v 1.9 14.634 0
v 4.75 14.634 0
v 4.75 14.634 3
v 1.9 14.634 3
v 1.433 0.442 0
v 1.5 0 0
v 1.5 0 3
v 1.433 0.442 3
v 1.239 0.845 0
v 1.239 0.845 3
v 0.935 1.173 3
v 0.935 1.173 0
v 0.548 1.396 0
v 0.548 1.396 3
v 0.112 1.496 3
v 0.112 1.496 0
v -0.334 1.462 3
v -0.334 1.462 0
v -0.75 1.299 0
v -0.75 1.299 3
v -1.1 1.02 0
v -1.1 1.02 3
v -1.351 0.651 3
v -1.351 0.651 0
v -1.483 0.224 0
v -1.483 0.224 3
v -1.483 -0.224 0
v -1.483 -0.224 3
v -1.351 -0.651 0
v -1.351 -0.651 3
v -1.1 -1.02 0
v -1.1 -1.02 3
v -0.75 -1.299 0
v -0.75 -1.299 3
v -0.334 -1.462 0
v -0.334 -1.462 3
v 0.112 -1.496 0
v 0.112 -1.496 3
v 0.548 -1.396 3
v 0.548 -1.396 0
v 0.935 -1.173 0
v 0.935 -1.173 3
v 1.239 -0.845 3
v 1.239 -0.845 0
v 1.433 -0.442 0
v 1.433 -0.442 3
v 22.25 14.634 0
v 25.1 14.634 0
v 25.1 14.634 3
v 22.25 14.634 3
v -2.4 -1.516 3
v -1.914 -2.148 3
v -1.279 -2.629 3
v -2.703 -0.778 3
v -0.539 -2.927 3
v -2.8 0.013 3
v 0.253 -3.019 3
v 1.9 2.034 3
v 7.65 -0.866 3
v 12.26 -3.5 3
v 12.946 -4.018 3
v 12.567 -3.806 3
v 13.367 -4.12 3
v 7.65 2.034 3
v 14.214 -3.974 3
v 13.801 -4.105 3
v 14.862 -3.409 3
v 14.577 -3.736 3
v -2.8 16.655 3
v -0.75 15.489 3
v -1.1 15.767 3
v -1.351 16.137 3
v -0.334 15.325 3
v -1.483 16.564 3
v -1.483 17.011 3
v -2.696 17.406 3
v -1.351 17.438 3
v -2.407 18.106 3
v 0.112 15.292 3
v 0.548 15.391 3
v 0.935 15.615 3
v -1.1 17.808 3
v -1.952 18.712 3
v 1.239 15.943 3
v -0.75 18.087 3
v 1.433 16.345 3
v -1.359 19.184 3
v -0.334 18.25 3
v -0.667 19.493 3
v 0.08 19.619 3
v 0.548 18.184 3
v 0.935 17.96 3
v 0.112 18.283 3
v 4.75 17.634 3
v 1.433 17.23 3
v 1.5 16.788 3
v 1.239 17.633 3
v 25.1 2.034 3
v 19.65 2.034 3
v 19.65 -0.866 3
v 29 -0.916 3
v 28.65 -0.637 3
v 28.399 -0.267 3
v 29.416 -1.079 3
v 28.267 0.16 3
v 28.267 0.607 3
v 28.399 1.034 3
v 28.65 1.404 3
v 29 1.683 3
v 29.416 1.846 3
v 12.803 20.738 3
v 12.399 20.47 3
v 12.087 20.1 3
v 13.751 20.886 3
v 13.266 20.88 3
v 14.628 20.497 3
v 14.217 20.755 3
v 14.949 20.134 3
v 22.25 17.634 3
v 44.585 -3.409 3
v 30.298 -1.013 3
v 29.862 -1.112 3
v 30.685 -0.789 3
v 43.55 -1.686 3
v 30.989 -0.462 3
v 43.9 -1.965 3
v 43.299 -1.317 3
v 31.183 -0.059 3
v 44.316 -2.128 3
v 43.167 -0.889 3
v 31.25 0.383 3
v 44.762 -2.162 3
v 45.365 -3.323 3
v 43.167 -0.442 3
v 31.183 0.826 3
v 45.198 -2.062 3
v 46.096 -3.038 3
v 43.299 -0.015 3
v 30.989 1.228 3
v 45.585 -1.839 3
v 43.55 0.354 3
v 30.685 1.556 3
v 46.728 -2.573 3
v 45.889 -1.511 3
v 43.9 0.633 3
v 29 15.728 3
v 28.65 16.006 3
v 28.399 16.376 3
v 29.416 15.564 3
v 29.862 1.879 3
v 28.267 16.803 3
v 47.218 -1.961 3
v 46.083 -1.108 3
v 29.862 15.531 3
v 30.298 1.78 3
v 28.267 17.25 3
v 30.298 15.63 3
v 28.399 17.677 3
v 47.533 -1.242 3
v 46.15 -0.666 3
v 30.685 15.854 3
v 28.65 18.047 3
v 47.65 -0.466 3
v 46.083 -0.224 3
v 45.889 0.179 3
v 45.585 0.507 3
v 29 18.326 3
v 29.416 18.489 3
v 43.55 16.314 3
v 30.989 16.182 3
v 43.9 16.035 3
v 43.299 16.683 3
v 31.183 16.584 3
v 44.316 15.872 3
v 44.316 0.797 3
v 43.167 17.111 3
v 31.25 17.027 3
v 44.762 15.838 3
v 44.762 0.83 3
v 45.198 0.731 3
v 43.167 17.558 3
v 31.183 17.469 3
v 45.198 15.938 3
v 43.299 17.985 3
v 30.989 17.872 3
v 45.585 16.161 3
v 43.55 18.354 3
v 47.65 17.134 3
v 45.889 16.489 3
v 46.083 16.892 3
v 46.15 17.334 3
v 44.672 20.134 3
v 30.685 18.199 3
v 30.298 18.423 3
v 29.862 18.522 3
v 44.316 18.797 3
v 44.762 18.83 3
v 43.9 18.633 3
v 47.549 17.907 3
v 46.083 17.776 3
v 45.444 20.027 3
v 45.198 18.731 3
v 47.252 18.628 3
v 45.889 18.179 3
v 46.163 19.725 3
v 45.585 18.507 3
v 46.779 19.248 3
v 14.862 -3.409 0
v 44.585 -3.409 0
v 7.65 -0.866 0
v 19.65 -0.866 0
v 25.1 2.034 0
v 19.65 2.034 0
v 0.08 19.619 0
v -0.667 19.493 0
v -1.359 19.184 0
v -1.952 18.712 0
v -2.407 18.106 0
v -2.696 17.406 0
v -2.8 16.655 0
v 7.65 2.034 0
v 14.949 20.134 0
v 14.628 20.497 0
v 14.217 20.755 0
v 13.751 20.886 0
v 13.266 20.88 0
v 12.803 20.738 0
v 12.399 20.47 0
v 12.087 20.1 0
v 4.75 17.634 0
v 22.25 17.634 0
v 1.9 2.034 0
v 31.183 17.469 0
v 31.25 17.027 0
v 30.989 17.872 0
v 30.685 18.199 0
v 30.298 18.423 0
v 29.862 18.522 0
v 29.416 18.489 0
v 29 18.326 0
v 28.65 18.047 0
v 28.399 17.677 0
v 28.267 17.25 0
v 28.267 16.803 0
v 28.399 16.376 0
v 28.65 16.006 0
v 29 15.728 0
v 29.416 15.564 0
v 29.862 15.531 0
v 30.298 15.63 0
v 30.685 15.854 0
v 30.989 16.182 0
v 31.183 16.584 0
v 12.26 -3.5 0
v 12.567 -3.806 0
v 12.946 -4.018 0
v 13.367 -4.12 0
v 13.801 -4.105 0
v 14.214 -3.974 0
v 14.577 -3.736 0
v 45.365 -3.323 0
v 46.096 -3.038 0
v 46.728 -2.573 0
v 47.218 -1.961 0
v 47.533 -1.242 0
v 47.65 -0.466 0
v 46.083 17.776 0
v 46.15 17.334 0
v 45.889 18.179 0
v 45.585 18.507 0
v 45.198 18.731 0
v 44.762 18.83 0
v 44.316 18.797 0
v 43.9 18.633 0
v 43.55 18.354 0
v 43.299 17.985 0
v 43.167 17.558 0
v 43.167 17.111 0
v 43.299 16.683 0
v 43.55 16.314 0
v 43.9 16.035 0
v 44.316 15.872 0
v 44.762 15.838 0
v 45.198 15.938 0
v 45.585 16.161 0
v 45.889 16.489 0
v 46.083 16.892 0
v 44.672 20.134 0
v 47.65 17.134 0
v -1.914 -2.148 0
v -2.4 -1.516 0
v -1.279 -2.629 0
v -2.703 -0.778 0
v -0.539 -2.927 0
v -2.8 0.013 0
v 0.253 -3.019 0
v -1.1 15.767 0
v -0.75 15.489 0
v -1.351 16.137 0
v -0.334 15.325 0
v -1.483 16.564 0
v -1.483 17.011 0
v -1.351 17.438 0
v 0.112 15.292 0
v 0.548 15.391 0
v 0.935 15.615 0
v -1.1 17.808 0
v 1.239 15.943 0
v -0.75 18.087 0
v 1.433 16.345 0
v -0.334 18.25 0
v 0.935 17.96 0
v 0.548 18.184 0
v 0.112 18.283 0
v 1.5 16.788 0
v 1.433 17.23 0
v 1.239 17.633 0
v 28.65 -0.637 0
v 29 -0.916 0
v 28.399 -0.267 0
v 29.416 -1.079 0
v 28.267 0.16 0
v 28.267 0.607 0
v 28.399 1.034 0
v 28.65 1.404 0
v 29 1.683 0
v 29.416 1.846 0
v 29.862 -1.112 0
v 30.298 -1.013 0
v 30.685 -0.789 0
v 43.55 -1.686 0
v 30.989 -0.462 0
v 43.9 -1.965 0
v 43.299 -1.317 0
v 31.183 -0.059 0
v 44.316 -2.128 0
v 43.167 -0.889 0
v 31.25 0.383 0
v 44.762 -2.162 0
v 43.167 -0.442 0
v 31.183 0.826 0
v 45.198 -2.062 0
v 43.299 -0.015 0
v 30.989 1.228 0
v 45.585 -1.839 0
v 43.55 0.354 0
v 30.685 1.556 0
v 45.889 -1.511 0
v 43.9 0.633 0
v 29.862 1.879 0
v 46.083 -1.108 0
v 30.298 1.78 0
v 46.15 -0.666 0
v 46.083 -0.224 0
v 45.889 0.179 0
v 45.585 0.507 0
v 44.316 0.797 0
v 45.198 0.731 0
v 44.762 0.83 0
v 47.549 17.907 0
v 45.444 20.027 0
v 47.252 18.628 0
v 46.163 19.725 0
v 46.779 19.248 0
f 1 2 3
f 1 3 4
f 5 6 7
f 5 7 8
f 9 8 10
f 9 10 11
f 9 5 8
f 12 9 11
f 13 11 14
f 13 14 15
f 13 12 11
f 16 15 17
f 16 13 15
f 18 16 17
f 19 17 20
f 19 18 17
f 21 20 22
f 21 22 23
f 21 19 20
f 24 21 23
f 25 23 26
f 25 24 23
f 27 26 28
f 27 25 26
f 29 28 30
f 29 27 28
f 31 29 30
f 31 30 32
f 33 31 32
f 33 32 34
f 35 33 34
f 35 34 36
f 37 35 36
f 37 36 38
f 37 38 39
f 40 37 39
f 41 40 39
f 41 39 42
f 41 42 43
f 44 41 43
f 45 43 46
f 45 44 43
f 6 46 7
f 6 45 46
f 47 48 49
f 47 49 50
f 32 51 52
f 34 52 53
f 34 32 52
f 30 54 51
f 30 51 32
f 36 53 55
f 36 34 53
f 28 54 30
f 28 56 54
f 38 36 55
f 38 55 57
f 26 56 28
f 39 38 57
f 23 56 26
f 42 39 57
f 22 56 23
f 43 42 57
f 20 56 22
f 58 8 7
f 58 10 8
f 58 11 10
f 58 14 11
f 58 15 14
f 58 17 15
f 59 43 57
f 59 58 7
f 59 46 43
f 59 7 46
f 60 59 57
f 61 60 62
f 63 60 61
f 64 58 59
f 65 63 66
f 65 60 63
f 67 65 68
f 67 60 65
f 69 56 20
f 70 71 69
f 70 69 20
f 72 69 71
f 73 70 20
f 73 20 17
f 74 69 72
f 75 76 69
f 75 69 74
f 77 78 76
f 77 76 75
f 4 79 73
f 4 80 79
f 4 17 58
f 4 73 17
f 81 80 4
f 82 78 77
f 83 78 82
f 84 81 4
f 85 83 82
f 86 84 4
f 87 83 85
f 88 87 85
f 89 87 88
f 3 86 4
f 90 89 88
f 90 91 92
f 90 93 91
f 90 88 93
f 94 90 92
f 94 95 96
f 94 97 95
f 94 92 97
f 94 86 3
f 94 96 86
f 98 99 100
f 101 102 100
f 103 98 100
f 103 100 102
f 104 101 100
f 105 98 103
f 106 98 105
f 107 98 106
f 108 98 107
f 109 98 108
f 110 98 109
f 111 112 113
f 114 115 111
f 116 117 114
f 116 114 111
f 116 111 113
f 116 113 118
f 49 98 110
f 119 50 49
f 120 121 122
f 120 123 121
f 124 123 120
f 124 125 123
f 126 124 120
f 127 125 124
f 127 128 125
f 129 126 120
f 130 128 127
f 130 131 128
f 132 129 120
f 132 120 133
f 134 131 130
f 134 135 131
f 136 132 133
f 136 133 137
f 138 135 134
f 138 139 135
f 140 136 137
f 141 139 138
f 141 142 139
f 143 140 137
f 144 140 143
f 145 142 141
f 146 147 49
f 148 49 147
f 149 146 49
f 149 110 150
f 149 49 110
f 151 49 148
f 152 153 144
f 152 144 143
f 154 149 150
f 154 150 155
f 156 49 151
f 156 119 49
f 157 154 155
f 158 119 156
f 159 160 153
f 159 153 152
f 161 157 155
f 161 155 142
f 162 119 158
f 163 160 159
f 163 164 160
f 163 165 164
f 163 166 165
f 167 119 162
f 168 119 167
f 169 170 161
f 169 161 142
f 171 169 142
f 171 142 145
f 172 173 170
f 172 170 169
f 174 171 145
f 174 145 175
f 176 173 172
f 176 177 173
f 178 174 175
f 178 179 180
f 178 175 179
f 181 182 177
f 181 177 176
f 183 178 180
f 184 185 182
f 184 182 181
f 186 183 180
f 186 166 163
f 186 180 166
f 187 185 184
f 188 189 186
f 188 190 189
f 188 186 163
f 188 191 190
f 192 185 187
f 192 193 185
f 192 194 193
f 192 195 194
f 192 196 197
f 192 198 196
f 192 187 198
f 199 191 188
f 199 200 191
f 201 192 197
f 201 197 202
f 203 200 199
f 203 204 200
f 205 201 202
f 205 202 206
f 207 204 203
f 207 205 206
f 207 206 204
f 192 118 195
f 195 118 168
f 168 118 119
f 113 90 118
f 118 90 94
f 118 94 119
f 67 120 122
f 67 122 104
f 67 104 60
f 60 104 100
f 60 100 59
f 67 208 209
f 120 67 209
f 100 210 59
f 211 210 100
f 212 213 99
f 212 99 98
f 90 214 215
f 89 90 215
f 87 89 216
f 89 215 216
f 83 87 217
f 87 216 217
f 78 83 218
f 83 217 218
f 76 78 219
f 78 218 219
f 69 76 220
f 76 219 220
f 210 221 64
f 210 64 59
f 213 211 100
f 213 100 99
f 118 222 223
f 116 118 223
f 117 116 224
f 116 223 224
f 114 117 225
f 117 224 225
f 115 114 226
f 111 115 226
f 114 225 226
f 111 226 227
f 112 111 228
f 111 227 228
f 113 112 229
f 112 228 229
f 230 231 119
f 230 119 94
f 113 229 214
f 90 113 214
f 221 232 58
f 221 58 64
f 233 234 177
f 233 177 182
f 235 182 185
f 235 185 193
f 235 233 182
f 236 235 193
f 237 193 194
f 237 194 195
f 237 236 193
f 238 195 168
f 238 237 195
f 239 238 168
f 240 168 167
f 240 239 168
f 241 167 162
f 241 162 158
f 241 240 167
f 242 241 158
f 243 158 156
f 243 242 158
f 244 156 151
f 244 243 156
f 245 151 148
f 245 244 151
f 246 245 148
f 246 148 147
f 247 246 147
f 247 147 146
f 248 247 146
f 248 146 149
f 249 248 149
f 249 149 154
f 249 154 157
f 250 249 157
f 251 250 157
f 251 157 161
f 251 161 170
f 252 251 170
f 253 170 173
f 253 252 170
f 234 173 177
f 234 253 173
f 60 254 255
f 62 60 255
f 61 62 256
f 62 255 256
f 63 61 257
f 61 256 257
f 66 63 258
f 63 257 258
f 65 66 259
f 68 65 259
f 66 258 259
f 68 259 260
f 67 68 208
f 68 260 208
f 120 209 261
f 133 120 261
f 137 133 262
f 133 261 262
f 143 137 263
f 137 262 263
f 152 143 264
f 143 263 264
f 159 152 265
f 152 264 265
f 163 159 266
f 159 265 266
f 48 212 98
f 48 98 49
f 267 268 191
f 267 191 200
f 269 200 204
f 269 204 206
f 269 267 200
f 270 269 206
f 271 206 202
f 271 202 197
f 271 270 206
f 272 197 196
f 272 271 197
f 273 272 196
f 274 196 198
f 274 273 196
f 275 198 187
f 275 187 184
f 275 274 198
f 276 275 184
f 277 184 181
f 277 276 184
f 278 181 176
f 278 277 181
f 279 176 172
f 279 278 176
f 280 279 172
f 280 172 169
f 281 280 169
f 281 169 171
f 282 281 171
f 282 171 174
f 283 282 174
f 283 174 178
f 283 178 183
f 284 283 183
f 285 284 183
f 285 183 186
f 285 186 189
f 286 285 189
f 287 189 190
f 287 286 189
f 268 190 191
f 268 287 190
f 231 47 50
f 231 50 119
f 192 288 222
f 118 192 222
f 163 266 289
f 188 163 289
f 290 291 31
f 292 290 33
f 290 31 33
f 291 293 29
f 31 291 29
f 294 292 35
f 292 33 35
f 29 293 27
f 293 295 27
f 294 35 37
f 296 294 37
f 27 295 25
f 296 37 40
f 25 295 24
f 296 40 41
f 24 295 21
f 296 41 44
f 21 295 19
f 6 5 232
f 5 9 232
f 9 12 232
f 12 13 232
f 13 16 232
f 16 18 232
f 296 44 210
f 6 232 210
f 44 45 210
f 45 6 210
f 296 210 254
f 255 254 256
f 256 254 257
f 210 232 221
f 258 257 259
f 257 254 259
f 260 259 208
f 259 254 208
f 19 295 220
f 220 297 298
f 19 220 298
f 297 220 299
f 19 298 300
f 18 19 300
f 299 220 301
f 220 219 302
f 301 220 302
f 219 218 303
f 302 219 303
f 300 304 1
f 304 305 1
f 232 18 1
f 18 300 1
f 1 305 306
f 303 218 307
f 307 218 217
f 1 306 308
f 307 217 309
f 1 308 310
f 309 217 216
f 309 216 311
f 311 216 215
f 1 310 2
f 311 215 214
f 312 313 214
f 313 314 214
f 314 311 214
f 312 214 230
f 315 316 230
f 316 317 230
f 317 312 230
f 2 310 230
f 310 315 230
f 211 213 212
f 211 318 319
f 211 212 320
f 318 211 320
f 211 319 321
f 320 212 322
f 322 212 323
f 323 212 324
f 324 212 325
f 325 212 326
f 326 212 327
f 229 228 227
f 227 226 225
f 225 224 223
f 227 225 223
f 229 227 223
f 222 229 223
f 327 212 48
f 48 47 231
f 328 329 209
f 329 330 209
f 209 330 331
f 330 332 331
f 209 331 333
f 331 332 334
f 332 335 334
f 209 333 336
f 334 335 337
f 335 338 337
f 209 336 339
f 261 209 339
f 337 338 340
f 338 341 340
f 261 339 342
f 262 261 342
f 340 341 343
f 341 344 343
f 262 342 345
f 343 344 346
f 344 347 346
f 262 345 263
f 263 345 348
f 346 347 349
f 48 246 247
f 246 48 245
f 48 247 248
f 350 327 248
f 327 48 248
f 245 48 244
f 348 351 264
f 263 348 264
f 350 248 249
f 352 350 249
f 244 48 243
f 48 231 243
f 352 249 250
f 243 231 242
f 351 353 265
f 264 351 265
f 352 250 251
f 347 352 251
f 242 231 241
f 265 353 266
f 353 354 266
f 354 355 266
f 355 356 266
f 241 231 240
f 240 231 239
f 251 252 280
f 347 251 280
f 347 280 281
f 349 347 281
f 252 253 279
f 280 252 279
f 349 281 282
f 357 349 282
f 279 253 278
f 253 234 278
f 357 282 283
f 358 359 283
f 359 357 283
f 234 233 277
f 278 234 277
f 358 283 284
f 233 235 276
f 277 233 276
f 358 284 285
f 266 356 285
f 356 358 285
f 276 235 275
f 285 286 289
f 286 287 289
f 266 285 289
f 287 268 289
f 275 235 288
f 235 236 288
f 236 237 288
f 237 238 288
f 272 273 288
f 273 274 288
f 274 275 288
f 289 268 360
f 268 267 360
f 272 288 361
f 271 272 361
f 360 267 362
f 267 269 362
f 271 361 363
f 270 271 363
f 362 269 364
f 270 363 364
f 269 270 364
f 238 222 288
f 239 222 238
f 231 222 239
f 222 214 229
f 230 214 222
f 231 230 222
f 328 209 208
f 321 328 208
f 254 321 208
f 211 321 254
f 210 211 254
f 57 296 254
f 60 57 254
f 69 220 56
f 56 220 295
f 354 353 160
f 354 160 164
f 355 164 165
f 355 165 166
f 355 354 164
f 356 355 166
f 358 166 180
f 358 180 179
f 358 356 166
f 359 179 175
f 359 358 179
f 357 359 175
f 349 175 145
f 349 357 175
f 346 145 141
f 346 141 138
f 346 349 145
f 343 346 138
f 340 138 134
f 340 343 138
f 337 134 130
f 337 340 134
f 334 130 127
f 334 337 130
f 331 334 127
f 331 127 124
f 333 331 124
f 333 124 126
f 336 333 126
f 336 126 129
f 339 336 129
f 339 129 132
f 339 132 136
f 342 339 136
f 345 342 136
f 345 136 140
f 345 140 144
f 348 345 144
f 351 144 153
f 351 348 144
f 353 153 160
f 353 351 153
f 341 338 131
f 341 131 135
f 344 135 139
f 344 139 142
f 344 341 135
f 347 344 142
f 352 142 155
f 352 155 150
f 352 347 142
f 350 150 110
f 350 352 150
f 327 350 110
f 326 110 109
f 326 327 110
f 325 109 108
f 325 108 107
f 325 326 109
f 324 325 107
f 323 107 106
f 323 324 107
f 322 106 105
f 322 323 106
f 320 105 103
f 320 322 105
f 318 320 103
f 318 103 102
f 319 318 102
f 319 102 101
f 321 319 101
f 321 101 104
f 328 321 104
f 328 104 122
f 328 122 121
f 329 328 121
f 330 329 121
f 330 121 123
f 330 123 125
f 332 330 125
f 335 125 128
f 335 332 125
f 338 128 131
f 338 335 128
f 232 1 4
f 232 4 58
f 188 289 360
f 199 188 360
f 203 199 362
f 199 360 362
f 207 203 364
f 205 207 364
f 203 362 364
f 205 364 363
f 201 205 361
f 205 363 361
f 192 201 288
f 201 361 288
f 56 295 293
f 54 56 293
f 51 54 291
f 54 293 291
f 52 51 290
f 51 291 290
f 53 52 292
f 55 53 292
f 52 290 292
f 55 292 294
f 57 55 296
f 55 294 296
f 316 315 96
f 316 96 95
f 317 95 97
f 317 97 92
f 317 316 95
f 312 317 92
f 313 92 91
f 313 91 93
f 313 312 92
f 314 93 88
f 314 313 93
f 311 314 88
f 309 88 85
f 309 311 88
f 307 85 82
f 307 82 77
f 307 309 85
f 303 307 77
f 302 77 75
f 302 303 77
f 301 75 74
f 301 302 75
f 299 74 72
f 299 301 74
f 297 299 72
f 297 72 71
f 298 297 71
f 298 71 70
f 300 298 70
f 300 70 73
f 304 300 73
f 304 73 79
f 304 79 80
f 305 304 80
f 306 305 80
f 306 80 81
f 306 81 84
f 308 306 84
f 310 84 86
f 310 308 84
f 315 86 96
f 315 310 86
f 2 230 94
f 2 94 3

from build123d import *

# Parameters (mm, degrees)
SKETCH1_R           = 1.5
BOSS_EXTRUDE1_DEPTH = 3


with BuildPart() as part:
    # Sketch1 → Boss-Extrude1 (new body)
    with BuildSketch(Plane.XY):
        with BuildLine():
            Line((44.671696982, 20.134210536), (14.948744814, 20.134210536))
            ThreePointArc((14.948744814, 20.134210536), (13.508437041, 20.900264991), (12.086852766, 20.1))
            Line((12.086852766, 20.1), (0.079653818, 19.618721067))
            ThreePointArc((0.079653818, 19.618721067), (-1.951692295, 18.711836018), (-2.8, 16.655338617))
            Line((-2.8, 16.655338617), (-2.8, 0.013082454))
            ThreePointArc((-2.8, 0.013082454), (-1.91420574, -2.147770093), (0.252672107, -3.018721067))
            Line((0.252672107, -3.018721067), (12.259871055, -3.5))
            ThreePointArc((12.259871055, -3.5), (13.584562431, -4.127366103), (14.862137332, -3.408897008))
            Line((14.862137332, -3.408897008), (44.5850895, -3.408897008))
            ThreePointArc((44.5850895, -3.408897008), (46.728413048, -2.573492827), (47.65, -0.465789464))
            Line((47.65, -0.465789464), (47.65, 17.134210536))
            ThreePointArc((47.65, 17.134210536), (46.779005205, 19.247896538), (44.671696982, 20.134210536))
        make_face()
        with Locations((29.75, 17.026583922)):
            Circle(SKETCH1_R, mode=Mode.SUBTRACT)
        with Locations((44.65, 17.334210536)):
            Circle(SKETCH1_R, mode=Mode.SUBTRACT)
        with Locations((44.65, -0.665789465)):
            Circle(SKETCH1_R, mode=Mode.SUBTRACT)
        with Locations((29.75, 0.383476379)):
            Circle(SKETCH1_R, mode=Mode.SUBTRACT)
        Circle(SKETCH1_R, mode=Mode.SUBTRACT)
        with Locations((0, 16.787592152)):
            Circle(SKETCH1_R, mode=Mode.SUBTRACT)
        Polygon((4.75, 14.634210535), (1.9, 14.634210535), (1.9, 2.034210535), (7.65, 2.034210535), (7.65, -0.865789465), (19.65, -0.865789465), (19.65, 2.034210535), (25.1, 2.034210535), (25.1, 14.634210535), (22.25, 14.634210535), (22.25, 17.634210536), (4.75, 17.634210536), align=None, mode=Mode.SUBTRACT)
    extrude(amount=BOSS_EXTRUDE1_DEPTH)


solid = part.part
